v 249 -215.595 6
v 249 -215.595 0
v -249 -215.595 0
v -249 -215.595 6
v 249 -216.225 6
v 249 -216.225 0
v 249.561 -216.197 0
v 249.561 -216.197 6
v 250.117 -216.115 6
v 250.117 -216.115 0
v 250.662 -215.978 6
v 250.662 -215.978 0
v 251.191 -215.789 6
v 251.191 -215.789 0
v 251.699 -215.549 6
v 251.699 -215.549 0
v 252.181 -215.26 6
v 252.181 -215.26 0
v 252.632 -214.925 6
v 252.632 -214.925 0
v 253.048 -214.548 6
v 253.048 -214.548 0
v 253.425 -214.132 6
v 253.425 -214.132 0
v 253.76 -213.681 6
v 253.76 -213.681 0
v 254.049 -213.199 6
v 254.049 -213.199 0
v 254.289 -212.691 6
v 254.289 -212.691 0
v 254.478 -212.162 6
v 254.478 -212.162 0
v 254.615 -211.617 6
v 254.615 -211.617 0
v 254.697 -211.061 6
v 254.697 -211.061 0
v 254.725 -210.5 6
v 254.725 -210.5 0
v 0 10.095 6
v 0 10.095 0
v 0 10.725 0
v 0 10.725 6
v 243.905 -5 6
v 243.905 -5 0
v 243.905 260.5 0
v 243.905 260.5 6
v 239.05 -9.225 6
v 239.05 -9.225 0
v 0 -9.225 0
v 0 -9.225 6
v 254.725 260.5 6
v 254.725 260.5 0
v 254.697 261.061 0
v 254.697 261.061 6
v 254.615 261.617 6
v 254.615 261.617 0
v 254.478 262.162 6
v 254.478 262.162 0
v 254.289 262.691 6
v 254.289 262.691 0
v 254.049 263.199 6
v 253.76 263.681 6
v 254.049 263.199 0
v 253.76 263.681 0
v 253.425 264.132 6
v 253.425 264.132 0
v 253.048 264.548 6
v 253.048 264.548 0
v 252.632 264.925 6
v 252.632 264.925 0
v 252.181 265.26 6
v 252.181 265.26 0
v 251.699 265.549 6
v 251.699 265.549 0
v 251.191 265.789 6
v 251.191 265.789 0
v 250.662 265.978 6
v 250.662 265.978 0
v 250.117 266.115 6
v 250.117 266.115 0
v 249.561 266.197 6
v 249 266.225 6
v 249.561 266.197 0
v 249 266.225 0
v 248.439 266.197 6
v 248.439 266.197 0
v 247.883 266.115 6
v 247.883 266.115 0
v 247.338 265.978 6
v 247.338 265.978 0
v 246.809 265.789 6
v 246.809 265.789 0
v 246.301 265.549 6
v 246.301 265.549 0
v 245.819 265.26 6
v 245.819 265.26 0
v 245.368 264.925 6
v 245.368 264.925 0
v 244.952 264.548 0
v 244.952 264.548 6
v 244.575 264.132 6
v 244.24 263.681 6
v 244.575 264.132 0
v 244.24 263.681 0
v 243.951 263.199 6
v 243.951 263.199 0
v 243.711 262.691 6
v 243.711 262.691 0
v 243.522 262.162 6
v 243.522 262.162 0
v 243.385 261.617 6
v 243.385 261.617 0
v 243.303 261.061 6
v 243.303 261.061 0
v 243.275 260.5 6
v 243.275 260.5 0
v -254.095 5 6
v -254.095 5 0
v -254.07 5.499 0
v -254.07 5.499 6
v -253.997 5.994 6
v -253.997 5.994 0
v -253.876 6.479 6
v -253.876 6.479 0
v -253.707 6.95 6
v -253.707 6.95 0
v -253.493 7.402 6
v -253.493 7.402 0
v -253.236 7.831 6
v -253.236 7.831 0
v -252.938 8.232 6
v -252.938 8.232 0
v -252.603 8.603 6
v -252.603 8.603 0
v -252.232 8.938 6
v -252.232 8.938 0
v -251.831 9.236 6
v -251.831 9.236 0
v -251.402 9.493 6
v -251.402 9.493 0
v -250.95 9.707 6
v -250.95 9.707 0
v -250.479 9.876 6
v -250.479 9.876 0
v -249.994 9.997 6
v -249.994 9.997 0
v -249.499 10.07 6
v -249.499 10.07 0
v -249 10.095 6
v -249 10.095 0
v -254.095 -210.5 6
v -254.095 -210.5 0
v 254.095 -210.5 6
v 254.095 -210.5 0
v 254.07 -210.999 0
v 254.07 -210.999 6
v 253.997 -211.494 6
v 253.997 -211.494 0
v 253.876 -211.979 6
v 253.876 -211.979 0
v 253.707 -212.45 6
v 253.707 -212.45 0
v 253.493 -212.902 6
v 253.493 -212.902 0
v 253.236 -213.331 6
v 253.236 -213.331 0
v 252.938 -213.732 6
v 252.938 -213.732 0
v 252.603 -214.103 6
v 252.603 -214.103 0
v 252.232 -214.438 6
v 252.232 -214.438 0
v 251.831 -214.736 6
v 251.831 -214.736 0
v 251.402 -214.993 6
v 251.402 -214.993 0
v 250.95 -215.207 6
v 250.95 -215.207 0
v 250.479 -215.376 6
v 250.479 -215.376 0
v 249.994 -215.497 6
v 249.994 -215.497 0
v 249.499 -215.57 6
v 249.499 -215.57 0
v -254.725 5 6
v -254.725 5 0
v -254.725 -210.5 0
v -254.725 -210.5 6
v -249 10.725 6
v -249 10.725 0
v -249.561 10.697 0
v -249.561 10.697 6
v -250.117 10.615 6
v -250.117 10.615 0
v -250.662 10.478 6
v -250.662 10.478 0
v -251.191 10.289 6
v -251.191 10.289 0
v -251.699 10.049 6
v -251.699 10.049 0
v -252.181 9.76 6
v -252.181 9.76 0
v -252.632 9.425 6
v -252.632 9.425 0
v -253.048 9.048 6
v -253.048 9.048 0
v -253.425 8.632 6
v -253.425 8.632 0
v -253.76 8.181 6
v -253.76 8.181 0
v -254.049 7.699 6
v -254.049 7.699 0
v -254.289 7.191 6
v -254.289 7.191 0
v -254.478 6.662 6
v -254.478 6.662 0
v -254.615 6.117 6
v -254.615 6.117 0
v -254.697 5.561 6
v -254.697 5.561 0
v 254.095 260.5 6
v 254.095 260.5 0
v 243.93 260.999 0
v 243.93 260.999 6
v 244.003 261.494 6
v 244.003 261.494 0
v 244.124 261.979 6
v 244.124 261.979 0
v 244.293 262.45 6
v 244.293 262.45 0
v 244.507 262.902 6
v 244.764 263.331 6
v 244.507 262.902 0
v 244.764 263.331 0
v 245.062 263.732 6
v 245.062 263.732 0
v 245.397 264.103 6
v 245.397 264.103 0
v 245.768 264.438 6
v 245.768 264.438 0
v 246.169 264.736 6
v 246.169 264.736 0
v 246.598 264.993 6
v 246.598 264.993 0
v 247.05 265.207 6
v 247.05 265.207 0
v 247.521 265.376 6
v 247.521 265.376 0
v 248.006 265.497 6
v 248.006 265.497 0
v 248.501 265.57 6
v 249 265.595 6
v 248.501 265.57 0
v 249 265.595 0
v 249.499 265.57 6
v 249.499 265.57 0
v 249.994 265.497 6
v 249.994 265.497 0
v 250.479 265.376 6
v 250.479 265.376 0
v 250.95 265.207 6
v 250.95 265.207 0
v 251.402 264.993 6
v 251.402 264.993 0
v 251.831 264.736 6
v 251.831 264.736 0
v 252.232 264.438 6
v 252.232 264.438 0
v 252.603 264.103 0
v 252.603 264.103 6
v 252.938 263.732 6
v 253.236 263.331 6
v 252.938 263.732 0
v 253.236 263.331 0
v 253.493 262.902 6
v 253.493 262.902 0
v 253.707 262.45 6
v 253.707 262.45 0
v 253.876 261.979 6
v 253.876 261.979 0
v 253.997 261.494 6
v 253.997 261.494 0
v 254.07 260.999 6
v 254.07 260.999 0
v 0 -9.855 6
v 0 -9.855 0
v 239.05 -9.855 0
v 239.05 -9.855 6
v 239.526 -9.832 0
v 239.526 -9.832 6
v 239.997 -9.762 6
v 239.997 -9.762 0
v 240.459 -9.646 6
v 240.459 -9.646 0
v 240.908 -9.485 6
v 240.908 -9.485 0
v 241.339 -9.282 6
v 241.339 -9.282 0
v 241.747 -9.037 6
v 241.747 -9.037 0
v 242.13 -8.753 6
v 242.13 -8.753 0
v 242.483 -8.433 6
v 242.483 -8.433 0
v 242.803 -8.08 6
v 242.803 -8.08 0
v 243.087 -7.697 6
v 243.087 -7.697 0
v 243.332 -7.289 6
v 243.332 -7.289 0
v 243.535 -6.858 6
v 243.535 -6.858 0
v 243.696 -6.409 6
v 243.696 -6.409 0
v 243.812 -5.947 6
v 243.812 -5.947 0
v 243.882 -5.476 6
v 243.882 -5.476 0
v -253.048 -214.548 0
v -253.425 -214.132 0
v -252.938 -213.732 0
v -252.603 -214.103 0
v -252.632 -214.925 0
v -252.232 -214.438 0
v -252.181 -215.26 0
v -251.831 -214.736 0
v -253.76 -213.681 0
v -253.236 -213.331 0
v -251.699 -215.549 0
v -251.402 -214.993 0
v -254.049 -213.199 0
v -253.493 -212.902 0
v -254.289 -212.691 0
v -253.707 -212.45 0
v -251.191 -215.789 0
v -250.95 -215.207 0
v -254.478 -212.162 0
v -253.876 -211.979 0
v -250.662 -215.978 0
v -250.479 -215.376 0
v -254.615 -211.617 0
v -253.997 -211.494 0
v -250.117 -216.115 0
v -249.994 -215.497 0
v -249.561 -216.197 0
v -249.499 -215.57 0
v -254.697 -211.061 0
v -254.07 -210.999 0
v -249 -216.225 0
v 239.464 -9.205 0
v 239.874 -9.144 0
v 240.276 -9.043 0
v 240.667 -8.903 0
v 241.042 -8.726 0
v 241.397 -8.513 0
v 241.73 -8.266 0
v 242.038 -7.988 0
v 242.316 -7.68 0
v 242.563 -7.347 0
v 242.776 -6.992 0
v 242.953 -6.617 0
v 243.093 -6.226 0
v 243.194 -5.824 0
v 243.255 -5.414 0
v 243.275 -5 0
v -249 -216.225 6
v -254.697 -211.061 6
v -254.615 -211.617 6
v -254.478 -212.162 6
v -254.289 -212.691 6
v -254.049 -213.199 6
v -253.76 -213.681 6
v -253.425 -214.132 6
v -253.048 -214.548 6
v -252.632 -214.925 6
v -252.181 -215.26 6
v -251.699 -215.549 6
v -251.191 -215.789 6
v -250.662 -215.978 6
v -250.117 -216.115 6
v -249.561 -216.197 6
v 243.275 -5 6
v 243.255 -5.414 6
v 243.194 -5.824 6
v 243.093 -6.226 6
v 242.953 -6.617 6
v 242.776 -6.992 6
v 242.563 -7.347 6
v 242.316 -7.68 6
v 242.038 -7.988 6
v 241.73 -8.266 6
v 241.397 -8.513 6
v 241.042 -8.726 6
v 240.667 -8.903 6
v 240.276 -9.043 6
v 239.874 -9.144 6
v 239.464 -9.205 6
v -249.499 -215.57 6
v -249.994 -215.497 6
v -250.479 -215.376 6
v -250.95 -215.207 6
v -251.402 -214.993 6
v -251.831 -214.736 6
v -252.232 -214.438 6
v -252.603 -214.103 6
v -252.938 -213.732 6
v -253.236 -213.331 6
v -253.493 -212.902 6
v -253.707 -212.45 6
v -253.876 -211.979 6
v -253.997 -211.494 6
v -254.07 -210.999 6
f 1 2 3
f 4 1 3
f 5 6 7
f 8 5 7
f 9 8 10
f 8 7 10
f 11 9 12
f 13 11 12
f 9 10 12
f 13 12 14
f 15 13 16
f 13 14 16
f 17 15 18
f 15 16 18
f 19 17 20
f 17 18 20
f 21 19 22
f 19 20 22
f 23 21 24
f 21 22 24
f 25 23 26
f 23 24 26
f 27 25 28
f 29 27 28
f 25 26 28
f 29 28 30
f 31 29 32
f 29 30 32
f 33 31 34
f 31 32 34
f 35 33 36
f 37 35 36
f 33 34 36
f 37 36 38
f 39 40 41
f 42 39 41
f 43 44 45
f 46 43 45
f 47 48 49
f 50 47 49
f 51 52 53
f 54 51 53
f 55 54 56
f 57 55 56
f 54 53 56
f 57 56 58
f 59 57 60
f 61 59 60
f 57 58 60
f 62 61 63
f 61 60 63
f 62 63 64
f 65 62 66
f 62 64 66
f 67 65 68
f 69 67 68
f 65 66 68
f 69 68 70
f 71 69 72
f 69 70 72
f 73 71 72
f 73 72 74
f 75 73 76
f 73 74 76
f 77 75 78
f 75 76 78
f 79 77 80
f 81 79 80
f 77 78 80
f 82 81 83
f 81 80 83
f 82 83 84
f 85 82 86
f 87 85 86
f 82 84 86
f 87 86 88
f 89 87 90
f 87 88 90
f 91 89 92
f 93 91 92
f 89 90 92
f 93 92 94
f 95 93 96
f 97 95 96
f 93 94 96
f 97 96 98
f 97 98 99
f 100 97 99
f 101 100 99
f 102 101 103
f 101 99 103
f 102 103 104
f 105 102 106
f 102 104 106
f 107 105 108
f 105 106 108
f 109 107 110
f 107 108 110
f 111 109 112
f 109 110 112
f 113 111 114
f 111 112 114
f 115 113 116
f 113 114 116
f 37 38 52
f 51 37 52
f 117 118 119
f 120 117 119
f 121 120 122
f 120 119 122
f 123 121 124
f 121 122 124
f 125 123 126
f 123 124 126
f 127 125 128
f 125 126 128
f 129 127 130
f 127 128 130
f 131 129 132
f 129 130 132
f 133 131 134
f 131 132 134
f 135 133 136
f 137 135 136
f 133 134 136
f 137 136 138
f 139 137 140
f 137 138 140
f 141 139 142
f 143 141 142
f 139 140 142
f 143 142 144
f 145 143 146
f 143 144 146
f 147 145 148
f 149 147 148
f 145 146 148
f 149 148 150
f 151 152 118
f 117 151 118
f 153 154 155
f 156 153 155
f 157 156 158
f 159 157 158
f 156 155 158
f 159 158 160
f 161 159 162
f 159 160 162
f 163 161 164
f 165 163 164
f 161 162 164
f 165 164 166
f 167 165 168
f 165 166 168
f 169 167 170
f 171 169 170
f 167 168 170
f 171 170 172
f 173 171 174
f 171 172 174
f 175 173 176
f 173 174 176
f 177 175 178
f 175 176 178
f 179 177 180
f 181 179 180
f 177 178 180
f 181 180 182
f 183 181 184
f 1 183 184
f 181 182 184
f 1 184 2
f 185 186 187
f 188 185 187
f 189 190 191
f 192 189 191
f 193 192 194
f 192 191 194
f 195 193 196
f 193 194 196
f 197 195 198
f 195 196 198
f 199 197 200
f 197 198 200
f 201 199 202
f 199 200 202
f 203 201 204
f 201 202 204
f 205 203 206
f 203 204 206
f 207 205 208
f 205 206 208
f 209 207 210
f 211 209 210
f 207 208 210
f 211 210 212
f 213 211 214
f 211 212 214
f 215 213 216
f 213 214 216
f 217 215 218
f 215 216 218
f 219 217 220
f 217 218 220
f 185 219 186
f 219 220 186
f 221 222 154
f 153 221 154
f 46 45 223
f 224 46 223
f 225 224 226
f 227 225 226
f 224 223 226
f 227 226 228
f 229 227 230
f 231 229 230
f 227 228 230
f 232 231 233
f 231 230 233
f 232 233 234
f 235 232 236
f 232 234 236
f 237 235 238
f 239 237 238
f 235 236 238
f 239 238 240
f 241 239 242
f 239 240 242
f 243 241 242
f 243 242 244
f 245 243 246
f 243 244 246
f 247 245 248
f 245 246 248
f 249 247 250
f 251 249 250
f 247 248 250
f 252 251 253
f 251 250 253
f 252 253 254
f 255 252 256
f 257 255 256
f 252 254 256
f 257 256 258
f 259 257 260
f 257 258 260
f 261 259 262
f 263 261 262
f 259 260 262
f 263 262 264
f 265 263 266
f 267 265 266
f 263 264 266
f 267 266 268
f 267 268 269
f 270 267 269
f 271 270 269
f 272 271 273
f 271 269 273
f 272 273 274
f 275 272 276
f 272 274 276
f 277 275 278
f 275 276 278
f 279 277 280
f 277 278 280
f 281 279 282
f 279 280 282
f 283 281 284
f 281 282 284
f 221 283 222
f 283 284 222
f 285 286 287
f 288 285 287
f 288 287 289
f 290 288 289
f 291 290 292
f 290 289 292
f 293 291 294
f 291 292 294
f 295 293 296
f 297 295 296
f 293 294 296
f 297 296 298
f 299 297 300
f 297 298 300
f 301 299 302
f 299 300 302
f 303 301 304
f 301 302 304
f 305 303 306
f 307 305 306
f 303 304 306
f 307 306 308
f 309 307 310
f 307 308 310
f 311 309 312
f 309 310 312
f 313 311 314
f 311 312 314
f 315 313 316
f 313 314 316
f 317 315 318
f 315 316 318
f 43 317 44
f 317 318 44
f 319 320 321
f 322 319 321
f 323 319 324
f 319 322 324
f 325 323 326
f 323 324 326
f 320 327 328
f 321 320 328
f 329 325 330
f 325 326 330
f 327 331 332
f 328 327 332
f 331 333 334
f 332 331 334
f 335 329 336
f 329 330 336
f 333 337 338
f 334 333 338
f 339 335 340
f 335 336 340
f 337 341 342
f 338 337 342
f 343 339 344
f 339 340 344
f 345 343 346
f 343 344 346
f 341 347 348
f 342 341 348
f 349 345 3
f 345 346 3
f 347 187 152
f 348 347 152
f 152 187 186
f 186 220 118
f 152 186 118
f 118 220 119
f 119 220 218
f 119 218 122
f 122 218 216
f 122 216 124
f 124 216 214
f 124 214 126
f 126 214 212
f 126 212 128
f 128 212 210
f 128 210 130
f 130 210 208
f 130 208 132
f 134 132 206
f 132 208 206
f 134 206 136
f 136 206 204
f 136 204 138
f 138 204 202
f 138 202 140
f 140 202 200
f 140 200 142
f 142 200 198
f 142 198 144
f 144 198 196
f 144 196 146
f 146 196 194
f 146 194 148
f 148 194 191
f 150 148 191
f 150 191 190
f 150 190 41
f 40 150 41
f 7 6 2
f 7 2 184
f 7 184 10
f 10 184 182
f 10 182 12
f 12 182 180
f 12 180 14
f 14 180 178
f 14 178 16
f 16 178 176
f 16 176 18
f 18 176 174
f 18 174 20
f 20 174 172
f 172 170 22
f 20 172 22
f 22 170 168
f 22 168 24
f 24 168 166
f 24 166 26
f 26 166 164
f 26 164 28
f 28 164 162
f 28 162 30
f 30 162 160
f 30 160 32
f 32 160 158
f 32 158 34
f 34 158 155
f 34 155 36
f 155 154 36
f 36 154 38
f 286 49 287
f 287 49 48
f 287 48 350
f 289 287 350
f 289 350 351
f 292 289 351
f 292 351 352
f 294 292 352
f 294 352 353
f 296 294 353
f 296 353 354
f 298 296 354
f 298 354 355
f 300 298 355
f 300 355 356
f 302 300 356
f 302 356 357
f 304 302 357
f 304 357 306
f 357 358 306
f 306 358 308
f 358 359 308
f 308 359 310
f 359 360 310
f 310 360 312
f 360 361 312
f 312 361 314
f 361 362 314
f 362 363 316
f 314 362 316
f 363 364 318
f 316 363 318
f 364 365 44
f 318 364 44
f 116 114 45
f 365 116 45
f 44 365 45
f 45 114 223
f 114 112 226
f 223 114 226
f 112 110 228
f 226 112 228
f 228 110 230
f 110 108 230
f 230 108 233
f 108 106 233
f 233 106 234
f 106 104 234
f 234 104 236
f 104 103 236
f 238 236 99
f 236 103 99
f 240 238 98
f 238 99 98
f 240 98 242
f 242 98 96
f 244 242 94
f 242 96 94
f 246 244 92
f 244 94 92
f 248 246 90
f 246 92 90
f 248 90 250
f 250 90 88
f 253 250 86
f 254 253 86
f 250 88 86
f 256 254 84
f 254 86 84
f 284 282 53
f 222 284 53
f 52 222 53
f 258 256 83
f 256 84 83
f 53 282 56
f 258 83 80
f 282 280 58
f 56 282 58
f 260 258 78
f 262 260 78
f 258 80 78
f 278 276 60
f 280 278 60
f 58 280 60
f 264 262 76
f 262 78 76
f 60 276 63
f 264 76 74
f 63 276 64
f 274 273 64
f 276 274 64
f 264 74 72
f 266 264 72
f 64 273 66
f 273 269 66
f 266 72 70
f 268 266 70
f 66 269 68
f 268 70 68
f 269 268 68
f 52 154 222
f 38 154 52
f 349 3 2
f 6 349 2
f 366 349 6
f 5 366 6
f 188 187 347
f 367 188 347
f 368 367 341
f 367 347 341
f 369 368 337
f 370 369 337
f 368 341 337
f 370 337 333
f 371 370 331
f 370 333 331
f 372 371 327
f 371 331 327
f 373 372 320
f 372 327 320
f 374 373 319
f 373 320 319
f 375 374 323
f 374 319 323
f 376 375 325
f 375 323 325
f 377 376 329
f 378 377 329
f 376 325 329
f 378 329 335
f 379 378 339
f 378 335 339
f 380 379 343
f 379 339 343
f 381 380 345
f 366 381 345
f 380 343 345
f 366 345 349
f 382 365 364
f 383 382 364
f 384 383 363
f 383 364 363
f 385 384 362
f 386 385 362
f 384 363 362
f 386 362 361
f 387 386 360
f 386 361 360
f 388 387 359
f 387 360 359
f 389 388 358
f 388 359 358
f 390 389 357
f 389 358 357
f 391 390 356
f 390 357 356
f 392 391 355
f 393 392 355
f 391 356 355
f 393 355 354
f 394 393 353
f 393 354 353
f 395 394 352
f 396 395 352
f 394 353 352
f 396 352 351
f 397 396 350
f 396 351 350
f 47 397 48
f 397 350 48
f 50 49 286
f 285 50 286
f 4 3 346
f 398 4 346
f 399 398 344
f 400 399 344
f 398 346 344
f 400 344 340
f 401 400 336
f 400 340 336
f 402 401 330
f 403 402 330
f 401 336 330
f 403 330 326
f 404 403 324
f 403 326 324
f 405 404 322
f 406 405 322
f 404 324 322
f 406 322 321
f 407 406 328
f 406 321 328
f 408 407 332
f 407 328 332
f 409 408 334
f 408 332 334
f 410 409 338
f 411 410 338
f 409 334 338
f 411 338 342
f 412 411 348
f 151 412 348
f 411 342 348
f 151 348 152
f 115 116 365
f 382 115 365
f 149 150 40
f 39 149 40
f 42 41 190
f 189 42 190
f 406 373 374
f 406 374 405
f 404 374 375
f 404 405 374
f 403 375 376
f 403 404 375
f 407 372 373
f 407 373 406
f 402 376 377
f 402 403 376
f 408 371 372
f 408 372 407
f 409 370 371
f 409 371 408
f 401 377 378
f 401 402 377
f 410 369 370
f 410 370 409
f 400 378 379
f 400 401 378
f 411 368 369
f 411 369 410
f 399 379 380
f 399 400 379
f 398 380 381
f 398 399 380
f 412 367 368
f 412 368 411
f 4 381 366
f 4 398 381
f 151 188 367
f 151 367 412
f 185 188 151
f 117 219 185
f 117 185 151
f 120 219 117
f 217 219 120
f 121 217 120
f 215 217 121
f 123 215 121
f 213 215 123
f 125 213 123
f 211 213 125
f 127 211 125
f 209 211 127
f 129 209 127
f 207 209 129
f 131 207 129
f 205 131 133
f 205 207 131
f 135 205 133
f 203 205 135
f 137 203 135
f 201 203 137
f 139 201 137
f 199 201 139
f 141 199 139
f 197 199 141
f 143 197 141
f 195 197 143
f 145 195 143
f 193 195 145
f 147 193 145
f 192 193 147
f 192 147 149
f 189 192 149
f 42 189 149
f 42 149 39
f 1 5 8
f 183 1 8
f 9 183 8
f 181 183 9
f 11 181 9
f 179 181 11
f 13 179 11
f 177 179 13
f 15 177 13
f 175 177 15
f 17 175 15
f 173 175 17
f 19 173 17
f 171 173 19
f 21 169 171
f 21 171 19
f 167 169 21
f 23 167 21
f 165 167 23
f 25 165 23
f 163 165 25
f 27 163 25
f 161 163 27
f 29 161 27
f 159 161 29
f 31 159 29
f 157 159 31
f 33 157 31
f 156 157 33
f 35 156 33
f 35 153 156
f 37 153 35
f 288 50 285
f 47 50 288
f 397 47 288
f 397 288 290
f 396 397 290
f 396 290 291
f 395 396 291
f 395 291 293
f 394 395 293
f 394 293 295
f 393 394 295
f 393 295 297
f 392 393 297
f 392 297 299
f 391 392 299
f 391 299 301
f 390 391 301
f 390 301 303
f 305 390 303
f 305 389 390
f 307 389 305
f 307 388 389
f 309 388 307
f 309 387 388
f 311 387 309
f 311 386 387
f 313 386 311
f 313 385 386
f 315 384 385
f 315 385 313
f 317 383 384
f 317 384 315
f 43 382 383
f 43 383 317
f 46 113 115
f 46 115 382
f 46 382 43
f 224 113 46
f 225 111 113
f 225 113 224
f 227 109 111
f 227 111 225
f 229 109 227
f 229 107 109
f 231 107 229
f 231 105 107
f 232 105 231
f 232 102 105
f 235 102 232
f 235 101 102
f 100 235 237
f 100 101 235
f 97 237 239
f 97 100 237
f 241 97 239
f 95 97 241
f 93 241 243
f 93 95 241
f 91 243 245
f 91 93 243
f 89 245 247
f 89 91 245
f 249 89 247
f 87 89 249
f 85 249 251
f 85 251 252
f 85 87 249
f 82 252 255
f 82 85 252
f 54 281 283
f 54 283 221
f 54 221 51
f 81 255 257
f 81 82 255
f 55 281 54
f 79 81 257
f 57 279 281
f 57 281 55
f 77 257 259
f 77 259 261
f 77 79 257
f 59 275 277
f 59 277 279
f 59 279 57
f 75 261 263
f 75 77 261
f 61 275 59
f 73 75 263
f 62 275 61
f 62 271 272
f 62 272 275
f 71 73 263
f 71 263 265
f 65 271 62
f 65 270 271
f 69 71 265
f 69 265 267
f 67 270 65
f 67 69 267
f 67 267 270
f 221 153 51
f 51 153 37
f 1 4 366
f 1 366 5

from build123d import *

# Parameters (mm, degrees)
F1_DEPTH = 6


with BuildPart() as f1:
    # F0 (on Top) → F1 (new body)
    with BuildSketch(Plane.XY):
        with BuildLine():
            ThreePointArc((243.905, 260.5), (249, 265.595), (254.095, 260.5))
            Line((254.095, 260.5), (254.095, -210.5))
            ThreePointArc((254.095, -210.5), (252.602709, -214.102709), (249, -215.595))
            Line((249, -215.595), (0, -215.595))
            Line((0, -215.595), (-249, -215.595))
            ThreePointArc((-249, -215.595), (-252.602709, -214.102709), (-254.095, -210.5))
            Line((-254.095, -210.5), (-254.095, 5))
            ThreePointArc((-254.095, 5), (-252.602709, 8.602709), (-249, 10.095))
            Line((-249, 10.095), (0, 10.095))
            Line((0, 10.095), (0, 10.116))
            Line((0, 10.116), (0, 10.725))
            Line((0, 10.725), (-249, 10.725))
            ThreePointArc((-249, 10.725), (-253.048186, 9.048186), (-254.725, 5))
            Line((-254.725, 5), (-254.725, -210.5))
            ThreePointArc((-254.725, -210.5), (-253.048186, -214.548186), (-249, -216.225))
            Line((-249, -216.225), (0, -216.225))
            Line((0, -216.225), (249, -216.225))
            ThreePointArc((249, -216.225), (253.048186, -214.548186), (254.725, -210.5))
            Line((254.725, -210.5), (254.725, 260.5))
            ThreePointArc((254.725, 260.5), (249, 266.225), (243.275, 260.5))
            Line((243.275, 260.5), (243.275, -5))
            ThreePointArc((243.275, -5), (242.037526, -7.987526), (239.050001, -9.224999))
            Line((239.050001, -9.224999), (236.658265, -9.224999))
            Line((236.658265, -9.224999), (0, -9.224999))
            Line((0, -9.224999), (0, -9.854999))
            Line((0, -9.854999), (239.050001, -9.854999))
            ThreePointArc((239.050001, -9.854999), (242.483004, -8.433003), (243.905, -5))
            Line((243.905, -5), (243.905, 260.5))
        make_face()
    extrude(amount=F1_DEPTH)


solid = f1.part
